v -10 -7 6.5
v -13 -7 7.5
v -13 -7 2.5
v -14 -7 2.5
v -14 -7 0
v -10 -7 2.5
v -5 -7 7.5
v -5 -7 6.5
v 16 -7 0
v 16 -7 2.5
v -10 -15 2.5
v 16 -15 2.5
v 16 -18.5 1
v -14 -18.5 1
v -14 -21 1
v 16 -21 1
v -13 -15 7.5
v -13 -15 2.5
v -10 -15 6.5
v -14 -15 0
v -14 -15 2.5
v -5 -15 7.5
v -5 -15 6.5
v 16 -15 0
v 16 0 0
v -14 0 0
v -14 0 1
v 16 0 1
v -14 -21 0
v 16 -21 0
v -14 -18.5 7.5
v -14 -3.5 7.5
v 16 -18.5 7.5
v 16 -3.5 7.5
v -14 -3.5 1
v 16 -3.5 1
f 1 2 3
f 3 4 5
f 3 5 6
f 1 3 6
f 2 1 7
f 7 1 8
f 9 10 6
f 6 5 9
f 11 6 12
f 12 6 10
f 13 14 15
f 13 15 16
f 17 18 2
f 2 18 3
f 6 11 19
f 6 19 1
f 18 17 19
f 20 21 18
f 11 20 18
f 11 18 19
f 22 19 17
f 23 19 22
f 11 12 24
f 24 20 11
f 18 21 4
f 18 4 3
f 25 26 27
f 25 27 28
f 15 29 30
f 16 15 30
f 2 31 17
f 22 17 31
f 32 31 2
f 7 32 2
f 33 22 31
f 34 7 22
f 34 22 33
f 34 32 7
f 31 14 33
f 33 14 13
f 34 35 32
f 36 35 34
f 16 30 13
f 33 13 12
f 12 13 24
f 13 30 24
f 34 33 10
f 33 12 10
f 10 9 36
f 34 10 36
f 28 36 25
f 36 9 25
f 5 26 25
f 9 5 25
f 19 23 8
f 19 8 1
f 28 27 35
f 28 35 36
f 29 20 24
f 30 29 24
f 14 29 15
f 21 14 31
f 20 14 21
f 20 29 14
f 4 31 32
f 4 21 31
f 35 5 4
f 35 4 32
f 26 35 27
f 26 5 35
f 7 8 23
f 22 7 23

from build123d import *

# Parameters (mm, degrees)
BOX038_W                   = 3
BOX038_H                   = 8
BOX038_DEPTH               = 4
BOX037_W                   = 8
BOX037_H                   = 8
BOX037_DEPTH               = 2
CHAMFER001_SIZE            = 1
CHAMFER001_PLACEMENT_ANGLE = 180
BOX004_W                   = 30
BOX004_H                   = 8
BOX004_DEPTH               = 2.5
BOX003_W                   = 30
BOX003_H                   = 15
BOX003_DEPTH               = 7.5
BOX002_W                   = 30
BOX002_H                   = 21
BOX002_DEPTH               = 1


with BuildPart() as cubo038:
    # Box038 → Box038 (new body)
    with BuildSketch(Plane(origin=(-13, -15, 2.5), x_dir=(1, 0, 0), z_dir=(0, 0, 1))):
        with Locations((1.5, 4)):
            Rectangle(BOX038_W, BOX038_H)
    extrude(amount=BOX038_DEPTH)


with BuildPart() as fusion002023:
    # Box037 → Box037 (new body)
    with BuildSketch(Plane(origin=(-13, -15, 6), x_dir=(1, 0, 0), z_dir=(0, 0, 1))):
        with Locations((4, 4)):
            Rectangle(BOX037_W, BOX037_H)
    extrude(amount=BOX037_DEPTH)

    # Chamfer001
    chamfer001_edges = [fusion002023.edges().sort_by_distance(p)[0] for p in [
        (-13, -11, 8),
    ]]
    chamfer(chamfer001_edges, length=CHAMFER001_SIZE)


with BuildPart() as fusion002023_1:
    # Chamfer001 placement: moved
    add(fusion002023.part.moved(Location((-18, -22, 0.5))).rotate(Axis((-18, -22, 0.5), (0, 0, 1)), CHAMFER001_PLACEMENT_ANGLE))

    # Fusion002023: union Cubo038
    add(cubo038.part)


with BuildPart() as cubo004:
    # Box004 → Box004 (new body)
    with BuildSketch(Plane(origin=(-14, -15, 0), x_dir=(1, 0, 0), z_dir=(0, 0, 1))):
        with Locations((15, 4)):
            Rectangle(BOX004_W, BOX004_H)
    extrude(amount=BOX004_DEPTH)


with BuildPart() as cubo003:
    # Box003 → Box003 (new body)
    with BuildSketch(Plane(origin=(-14, -18.5, 0), x_dir=(1, 0, 0), z_dir=(0, 0, 1))):
        with Locations((15, 7.5)):
            Rectangle(BOX003_W, BOX003_H)
    extrude(amount=BOX003_DEPTH)


with BuildPart() as cut059:
    # Box002 → Box002 (new body)
    with BuildSketch(Plane(origin=(-14, -21, 0), x_dir=(1, 0, 0), z_dir=(0, 0, 1))):
        with Locations((15, 10.5)):
            Rectangle(BOX002_W, BOX002_H)
    extrude(amount=BOX002_DEPTH)

    # Fusion001: union Cubo003
    add(cubo003.part)

    # Cut006: cut Cubo004
    add(cubo004.part, mode=Mode.SUBTRACT)

    # Cut059: cut Fusion002023
    add(fusion002023_1.part, mode=Mode.SUBTRACT)


solid = cut059.part
